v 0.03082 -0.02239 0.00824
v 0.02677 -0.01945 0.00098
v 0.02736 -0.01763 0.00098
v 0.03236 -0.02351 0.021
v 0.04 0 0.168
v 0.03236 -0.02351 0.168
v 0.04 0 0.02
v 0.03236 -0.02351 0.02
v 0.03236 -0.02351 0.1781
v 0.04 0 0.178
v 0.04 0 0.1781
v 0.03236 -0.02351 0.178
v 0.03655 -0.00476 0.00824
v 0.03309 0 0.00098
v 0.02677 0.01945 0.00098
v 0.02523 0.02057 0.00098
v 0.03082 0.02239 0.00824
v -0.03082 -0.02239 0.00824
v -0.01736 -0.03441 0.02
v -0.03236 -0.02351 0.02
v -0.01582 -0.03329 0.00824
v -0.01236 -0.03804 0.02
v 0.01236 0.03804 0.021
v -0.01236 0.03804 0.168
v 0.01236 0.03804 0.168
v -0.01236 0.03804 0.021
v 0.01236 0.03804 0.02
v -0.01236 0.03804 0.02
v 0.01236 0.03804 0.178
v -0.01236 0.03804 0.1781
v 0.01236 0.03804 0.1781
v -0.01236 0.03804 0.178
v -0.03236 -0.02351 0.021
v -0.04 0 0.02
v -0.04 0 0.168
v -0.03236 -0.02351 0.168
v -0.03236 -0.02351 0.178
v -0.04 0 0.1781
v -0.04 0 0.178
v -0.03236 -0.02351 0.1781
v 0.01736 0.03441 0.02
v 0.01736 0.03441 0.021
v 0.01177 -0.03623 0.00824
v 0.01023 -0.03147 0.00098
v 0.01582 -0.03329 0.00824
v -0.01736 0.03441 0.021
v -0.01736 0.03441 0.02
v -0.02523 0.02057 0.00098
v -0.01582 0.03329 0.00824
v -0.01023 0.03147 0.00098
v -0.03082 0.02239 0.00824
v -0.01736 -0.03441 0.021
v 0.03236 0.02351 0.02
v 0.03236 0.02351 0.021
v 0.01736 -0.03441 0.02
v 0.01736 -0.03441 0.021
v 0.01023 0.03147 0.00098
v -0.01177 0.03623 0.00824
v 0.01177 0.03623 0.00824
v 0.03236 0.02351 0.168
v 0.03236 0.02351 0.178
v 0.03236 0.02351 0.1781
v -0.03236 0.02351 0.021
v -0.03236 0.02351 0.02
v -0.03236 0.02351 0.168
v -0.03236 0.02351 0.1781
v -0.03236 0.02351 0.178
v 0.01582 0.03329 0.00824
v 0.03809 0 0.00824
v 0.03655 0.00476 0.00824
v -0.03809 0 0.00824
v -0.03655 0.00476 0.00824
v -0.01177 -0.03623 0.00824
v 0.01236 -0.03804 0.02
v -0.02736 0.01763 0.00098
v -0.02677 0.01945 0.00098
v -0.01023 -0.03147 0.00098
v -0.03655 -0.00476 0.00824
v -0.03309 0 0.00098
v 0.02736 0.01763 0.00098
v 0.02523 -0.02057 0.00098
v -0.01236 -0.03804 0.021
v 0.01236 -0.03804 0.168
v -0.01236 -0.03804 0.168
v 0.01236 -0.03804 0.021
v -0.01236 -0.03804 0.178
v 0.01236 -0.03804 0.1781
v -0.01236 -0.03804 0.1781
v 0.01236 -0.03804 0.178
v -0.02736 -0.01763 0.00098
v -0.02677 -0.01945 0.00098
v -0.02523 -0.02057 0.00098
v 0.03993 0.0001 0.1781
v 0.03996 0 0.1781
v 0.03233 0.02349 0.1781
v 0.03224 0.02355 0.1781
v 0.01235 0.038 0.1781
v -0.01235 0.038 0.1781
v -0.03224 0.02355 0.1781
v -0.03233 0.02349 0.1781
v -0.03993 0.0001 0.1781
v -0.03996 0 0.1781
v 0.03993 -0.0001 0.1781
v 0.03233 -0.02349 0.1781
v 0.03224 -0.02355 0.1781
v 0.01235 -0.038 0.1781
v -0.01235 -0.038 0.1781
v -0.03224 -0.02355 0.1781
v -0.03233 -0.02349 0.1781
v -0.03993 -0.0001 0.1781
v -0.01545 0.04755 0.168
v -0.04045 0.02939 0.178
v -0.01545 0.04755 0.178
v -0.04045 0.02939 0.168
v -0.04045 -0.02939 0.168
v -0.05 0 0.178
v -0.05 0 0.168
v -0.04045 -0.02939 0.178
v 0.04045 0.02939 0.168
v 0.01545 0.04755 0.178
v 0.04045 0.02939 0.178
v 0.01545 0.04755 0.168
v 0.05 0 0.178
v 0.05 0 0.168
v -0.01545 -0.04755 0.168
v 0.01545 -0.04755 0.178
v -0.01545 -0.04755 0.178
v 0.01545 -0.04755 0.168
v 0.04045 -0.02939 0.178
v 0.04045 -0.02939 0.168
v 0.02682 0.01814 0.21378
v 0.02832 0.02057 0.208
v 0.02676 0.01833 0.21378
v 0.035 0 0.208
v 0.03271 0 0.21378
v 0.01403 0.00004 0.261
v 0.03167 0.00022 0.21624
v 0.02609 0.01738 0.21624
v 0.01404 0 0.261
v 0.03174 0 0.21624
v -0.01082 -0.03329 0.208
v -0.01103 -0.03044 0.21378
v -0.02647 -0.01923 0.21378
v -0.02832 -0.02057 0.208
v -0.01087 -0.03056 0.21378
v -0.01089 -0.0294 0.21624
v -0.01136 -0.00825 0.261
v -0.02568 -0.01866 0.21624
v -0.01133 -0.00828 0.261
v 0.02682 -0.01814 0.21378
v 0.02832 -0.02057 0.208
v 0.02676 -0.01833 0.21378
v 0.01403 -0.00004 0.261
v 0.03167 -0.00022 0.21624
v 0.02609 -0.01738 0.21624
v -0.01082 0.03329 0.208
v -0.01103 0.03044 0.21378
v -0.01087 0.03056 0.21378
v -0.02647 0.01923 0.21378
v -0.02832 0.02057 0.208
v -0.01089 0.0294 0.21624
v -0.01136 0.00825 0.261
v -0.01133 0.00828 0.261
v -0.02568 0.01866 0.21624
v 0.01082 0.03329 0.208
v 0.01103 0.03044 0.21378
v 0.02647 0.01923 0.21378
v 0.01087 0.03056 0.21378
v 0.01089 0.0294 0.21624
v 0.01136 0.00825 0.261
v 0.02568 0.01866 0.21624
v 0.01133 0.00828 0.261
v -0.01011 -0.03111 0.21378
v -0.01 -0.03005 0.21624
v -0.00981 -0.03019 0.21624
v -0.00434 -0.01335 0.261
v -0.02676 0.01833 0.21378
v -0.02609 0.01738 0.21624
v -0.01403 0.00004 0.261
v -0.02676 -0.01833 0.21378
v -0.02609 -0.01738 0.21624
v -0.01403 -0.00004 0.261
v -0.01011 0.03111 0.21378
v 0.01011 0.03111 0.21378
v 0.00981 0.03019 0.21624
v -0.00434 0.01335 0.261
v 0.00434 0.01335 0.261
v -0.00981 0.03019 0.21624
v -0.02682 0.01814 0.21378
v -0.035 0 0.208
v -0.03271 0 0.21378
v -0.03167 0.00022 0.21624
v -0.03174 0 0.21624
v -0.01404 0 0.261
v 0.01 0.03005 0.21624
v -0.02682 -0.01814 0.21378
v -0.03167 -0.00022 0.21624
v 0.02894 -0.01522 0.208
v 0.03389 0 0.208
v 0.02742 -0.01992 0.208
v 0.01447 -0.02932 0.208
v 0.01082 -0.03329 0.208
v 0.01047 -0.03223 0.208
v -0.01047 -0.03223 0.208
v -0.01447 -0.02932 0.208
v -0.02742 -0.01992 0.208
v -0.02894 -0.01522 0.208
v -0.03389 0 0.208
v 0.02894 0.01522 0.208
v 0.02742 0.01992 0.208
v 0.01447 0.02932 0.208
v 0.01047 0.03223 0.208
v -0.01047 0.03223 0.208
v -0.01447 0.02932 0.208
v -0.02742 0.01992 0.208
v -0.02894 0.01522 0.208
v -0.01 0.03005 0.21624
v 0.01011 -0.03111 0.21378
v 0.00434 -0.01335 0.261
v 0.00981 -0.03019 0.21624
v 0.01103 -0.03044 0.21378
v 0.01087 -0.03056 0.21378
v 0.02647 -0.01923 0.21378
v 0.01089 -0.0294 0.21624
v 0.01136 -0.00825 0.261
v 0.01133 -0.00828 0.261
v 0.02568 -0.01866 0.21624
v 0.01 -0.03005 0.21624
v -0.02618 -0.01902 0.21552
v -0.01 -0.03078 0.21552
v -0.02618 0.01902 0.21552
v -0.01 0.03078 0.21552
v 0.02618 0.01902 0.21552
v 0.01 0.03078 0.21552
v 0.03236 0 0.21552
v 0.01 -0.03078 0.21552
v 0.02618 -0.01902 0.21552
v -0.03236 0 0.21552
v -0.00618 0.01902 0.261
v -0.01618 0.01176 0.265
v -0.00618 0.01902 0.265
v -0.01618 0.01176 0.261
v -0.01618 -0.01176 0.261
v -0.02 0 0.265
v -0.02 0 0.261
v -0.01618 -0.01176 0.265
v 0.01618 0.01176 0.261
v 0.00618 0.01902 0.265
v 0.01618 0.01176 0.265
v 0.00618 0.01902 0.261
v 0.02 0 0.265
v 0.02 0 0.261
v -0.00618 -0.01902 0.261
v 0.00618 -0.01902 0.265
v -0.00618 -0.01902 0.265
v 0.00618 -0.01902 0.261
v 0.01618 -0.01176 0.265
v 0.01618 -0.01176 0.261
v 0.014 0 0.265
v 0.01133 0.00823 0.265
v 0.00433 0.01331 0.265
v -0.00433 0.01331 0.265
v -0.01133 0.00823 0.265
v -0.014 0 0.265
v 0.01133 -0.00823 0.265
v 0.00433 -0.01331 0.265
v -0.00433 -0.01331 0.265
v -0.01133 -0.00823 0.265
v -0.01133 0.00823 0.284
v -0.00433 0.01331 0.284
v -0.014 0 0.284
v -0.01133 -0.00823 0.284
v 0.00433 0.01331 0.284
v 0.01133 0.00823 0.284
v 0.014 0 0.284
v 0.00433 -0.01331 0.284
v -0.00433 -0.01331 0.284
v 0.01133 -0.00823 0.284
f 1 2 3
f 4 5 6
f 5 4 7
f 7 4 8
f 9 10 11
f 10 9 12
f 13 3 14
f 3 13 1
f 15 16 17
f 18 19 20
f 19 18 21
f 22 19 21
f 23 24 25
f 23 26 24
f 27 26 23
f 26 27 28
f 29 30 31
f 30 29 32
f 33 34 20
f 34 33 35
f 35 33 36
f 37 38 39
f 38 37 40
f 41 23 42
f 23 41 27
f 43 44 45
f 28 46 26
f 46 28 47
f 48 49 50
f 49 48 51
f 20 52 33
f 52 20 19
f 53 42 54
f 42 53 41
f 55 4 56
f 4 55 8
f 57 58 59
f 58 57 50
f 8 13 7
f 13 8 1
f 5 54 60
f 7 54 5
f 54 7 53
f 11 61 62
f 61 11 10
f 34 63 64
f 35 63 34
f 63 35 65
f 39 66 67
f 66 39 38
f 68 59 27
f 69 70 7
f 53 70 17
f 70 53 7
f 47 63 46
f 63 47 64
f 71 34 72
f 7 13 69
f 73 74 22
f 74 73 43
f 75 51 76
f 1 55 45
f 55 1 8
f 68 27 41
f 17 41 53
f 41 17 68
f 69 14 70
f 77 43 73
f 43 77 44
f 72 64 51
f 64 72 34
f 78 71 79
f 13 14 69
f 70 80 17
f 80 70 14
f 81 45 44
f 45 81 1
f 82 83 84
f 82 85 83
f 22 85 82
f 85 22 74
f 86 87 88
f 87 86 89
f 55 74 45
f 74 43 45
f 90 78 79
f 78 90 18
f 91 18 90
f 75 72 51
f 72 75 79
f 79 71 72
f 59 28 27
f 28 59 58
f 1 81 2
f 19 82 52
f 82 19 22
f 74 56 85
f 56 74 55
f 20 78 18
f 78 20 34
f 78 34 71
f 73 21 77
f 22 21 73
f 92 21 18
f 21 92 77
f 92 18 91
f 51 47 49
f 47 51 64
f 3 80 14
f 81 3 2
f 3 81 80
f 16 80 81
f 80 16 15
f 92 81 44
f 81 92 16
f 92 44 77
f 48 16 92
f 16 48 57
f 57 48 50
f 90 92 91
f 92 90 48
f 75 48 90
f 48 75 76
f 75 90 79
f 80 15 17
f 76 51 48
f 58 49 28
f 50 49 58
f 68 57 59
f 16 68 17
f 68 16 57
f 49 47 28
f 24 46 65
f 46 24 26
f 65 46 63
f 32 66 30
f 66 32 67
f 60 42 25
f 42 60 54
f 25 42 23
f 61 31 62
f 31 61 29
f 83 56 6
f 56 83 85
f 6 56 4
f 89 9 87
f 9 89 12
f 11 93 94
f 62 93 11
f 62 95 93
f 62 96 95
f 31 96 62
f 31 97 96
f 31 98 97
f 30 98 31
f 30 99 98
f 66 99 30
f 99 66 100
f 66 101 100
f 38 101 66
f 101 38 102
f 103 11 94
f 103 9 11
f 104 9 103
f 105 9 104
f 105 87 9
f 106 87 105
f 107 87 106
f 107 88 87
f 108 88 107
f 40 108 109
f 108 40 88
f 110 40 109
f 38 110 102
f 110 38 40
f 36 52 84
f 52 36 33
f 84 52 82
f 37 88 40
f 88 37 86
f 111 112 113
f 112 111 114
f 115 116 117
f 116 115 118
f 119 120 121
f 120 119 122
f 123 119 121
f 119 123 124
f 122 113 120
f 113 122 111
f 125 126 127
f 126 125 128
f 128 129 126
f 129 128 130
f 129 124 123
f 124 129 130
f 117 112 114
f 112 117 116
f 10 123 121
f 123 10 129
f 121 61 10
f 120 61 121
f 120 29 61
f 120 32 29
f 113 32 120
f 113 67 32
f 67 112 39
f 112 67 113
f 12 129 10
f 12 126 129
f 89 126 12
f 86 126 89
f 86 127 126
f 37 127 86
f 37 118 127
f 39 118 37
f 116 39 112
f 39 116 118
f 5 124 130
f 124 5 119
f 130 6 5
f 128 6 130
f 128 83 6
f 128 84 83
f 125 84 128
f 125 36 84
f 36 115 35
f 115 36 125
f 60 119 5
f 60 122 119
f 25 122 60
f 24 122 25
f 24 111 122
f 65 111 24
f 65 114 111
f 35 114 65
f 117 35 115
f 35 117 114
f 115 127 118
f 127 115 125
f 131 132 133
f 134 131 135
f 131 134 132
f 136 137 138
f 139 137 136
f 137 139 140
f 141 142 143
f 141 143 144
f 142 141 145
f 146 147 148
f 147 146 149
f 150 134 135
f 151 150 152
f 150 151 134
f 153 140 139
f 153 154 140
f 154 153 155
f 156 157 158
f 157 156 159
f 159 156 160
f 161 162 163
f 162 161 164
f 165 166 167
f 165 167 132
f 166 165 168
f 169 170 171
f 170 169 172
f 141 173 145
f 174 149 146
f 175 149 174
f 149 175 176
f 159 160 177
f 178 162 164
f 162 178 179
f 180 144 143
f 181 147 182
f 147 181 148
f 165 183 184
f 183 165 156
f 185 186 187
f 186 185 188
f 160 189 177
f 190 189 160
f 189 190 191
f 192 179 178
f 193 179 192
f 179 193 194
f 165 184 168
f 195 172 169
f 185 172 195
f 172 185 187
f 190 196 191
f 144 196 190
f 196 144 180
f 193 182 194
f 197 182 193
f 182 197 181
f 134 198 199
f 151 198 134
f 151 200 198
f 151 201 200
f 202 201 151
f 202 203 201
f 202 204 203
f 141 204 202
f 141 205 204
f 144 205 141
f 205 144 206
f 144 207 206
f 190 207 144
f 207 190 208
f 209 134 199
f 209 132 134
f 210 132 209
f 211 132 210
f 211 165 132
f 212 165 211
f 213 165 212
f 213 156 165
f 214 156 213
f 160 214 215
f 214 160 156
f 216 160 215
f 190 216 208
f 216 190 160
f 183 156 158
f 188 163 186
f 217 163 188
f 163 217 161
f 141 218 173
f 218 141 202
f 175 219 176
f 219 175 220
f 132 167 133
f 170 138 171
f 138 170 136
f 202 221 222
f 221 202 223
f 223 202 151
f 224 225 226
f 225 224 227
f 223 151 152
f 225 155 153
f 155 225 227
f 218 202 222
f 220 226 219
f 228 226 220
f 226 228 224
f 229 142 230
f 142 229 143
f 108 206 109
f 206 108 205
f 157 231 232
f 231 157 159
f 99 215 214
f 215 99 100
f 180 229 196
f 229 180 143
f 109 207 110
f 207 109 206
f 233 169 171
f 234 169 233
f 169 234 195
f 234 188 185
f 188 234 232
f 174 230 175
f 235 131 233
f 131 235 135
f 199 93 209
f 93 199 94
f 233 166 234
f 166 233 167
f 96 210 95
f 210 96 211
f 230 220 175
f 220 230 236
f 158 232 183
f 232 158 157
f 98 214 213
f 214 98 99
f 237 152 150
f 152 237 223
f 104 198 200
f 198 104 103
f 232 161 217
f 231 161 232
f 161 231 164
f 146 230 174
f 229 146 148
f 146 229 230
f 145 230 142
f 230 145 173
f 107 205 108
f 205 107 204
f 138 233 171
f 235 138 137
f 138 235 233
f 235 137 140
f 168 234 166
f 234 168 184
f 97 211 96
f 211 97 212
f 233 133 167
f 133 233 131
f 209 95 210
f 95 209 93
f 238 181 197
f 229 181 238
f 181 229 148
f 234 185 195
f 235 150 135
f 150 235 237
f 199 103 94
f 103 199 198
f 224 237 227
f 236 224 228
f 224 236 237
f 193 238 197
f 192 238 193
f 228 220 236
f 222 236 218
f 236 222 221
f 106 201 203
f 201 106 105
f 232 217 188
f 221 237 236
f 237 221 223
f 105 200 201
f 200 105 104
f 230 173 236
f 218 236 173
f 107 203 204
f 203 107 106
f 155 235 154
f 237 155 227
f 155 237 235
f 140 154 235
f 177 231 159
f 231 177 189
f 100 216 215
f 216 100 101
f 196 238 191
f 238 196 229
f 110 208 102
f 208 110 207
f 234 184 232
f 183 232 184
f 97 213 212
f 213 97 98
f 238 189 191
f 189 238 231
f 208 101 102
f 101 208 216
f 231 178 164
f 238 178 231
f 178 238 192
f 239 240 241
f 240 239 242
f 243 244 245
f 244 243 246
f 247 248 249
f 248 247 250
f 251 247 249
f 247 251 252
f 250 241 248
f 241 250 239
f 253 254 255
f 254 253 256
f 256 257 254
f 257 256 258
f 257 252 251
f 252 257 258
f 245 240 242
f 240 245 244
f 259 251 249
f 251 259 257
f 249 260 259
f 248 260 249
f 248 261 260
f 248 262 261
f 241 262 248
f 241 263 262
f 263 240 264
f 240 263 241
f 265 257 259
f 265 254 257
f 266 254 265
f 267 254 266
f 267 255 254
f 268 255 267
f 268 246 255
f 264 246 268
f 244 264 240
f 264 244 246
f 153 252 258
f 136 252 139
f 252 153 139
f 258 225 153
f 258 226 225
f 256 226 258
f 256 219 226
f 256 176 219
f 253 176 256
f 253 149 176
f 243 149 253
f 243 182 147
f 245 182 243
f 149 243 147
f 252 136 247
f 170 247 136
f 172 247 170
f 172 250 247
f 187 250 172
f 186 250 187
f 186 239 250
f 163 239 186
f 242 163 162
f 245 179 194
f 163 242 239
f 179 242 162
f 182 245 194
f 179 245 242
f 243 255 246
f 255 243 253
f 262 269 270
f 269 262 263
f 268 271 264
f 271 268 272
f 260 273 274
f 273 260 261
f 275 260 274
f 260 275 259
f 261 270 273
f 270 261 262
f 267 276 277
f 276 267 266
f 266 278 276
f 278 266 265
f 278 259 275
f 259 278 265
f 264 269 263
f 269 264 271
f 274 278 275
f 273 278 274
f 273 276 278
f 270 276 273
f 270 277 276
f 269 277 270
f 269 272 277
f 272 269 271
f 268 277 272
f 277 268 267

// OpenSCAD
/** easy_grasp_bottle.scad - 3D model of our "bartender robot" bottles.
 * Includes extra "grasping collar" for use in Gazebo.
 *
 * Note: units in millimeters, scale for ROS.
 * Note: total height with cap 287 mm, without 285 mm,
 * cap diameter 30 mm, screw diameter 28,
 * collar diameter 40 mm, collar thickness 2 mm
 * 
 * (c) 2018, fnh, hendrich@informatik.uni-hamburg.de
 */
 
 
fn  = 10; // was: 50
eps = 0.1;
 
// scale and change origin for use with ROS:
scale( [0.001, 0.001, 0.001] ) 
  //translate( [0,0,-284] ) 
    bottle();
 
 
 
 /**
  * The bottle consists of four parts:
  * - the "pouring opening" with the cap screw (but without threads!)
  * - a cone
  * - the main part
  * - a rounded bottom
  * Origin is at the bottom center.
  */
 module bottle( 
   main_diameter = 80.0,
   screw_diameter = 28.0,
   screw_height = 19.0,
   collar_diameter = 40.0,
   collar_height = 4.0,
   cone1_diameter = 70.0,
   cone1_height = 30.0,
   cone2_height = 53.0,
   main_height = 158.0,
   bottom_diameter = 60.0,
   bottom_height = 20.0,
   grasp_collar_diameter = 100,
   grasp_collar_height = 10,
   ) 
 {
   // bottom part
   // cylinder( d1=bottom_diameter, d2=main_diameter, h=bottom_height+eps, $fn=fn, center=false );   
   hh = bottom_height;
   ww = main_diameter - bottom_diameter;
   translate( [0,0,hh] ) 
   minkowski() { 
     cylinder( d=bottom_diameter, h=1, $fn=fn, center=false ); 
     scale( [ww,ww,2*hh] ) sphere( d=1, $fn=fn );
   }
   
   // main part
   translate( [0,0,bottom_height] )
     cylinder( d=main_diameter, h=main_height+eps, $fn=fn, center=false );

   // extra grasping collor (for Gazebo+robot gripper)
   translate( [0,0,bottom_height+main_height-grasp_collar_height] )
     cylinder( d=grasp_collar_diameter, h=grasp_collar_height, $fn=fn, center=false );
   
   // cone part
//   translate( [0,0,bottom_height+main_height] )
//     cylinder( d1=main_diameter, d2=cone1_diameter, h=cone1_height+eps, $fn=fn, center=false );
   translate( [0,0,bottom_height+main_height+cone1_height] )
     cylinder( d1=cone1_diameter, d2=screw_diameter, h=cone2_height+eps, $fn=fn, center=false );

   // hhh = 2.23;
   hhh = 1.6;
   translate( [0,0,bottom_height+main_height-eps] )
     scale( [1,1,hhh] ) sphere( d=main_diameter, $fn=fn );   
   
   
   // original grasping collar (at the cap)
   cone_height = cone1_height + cone2_height;
   translate( [0,0,bottom_height+main_height+cone_height] )
     cylinder( d=collar_diameter, h=collar_height, $fn=fn, center=false );
   
   // simplified screw/cap part
   translate( [0,0,bottom_height+main_height+cone_height+collar_height] )
     cylinder( d=screw_diameter, h=screw_height, $fn=fn, center=false );
     
   echo( "total height: " );
   echo( bottom_height+main_height+cone_height+collar_height+screw_height );
}
